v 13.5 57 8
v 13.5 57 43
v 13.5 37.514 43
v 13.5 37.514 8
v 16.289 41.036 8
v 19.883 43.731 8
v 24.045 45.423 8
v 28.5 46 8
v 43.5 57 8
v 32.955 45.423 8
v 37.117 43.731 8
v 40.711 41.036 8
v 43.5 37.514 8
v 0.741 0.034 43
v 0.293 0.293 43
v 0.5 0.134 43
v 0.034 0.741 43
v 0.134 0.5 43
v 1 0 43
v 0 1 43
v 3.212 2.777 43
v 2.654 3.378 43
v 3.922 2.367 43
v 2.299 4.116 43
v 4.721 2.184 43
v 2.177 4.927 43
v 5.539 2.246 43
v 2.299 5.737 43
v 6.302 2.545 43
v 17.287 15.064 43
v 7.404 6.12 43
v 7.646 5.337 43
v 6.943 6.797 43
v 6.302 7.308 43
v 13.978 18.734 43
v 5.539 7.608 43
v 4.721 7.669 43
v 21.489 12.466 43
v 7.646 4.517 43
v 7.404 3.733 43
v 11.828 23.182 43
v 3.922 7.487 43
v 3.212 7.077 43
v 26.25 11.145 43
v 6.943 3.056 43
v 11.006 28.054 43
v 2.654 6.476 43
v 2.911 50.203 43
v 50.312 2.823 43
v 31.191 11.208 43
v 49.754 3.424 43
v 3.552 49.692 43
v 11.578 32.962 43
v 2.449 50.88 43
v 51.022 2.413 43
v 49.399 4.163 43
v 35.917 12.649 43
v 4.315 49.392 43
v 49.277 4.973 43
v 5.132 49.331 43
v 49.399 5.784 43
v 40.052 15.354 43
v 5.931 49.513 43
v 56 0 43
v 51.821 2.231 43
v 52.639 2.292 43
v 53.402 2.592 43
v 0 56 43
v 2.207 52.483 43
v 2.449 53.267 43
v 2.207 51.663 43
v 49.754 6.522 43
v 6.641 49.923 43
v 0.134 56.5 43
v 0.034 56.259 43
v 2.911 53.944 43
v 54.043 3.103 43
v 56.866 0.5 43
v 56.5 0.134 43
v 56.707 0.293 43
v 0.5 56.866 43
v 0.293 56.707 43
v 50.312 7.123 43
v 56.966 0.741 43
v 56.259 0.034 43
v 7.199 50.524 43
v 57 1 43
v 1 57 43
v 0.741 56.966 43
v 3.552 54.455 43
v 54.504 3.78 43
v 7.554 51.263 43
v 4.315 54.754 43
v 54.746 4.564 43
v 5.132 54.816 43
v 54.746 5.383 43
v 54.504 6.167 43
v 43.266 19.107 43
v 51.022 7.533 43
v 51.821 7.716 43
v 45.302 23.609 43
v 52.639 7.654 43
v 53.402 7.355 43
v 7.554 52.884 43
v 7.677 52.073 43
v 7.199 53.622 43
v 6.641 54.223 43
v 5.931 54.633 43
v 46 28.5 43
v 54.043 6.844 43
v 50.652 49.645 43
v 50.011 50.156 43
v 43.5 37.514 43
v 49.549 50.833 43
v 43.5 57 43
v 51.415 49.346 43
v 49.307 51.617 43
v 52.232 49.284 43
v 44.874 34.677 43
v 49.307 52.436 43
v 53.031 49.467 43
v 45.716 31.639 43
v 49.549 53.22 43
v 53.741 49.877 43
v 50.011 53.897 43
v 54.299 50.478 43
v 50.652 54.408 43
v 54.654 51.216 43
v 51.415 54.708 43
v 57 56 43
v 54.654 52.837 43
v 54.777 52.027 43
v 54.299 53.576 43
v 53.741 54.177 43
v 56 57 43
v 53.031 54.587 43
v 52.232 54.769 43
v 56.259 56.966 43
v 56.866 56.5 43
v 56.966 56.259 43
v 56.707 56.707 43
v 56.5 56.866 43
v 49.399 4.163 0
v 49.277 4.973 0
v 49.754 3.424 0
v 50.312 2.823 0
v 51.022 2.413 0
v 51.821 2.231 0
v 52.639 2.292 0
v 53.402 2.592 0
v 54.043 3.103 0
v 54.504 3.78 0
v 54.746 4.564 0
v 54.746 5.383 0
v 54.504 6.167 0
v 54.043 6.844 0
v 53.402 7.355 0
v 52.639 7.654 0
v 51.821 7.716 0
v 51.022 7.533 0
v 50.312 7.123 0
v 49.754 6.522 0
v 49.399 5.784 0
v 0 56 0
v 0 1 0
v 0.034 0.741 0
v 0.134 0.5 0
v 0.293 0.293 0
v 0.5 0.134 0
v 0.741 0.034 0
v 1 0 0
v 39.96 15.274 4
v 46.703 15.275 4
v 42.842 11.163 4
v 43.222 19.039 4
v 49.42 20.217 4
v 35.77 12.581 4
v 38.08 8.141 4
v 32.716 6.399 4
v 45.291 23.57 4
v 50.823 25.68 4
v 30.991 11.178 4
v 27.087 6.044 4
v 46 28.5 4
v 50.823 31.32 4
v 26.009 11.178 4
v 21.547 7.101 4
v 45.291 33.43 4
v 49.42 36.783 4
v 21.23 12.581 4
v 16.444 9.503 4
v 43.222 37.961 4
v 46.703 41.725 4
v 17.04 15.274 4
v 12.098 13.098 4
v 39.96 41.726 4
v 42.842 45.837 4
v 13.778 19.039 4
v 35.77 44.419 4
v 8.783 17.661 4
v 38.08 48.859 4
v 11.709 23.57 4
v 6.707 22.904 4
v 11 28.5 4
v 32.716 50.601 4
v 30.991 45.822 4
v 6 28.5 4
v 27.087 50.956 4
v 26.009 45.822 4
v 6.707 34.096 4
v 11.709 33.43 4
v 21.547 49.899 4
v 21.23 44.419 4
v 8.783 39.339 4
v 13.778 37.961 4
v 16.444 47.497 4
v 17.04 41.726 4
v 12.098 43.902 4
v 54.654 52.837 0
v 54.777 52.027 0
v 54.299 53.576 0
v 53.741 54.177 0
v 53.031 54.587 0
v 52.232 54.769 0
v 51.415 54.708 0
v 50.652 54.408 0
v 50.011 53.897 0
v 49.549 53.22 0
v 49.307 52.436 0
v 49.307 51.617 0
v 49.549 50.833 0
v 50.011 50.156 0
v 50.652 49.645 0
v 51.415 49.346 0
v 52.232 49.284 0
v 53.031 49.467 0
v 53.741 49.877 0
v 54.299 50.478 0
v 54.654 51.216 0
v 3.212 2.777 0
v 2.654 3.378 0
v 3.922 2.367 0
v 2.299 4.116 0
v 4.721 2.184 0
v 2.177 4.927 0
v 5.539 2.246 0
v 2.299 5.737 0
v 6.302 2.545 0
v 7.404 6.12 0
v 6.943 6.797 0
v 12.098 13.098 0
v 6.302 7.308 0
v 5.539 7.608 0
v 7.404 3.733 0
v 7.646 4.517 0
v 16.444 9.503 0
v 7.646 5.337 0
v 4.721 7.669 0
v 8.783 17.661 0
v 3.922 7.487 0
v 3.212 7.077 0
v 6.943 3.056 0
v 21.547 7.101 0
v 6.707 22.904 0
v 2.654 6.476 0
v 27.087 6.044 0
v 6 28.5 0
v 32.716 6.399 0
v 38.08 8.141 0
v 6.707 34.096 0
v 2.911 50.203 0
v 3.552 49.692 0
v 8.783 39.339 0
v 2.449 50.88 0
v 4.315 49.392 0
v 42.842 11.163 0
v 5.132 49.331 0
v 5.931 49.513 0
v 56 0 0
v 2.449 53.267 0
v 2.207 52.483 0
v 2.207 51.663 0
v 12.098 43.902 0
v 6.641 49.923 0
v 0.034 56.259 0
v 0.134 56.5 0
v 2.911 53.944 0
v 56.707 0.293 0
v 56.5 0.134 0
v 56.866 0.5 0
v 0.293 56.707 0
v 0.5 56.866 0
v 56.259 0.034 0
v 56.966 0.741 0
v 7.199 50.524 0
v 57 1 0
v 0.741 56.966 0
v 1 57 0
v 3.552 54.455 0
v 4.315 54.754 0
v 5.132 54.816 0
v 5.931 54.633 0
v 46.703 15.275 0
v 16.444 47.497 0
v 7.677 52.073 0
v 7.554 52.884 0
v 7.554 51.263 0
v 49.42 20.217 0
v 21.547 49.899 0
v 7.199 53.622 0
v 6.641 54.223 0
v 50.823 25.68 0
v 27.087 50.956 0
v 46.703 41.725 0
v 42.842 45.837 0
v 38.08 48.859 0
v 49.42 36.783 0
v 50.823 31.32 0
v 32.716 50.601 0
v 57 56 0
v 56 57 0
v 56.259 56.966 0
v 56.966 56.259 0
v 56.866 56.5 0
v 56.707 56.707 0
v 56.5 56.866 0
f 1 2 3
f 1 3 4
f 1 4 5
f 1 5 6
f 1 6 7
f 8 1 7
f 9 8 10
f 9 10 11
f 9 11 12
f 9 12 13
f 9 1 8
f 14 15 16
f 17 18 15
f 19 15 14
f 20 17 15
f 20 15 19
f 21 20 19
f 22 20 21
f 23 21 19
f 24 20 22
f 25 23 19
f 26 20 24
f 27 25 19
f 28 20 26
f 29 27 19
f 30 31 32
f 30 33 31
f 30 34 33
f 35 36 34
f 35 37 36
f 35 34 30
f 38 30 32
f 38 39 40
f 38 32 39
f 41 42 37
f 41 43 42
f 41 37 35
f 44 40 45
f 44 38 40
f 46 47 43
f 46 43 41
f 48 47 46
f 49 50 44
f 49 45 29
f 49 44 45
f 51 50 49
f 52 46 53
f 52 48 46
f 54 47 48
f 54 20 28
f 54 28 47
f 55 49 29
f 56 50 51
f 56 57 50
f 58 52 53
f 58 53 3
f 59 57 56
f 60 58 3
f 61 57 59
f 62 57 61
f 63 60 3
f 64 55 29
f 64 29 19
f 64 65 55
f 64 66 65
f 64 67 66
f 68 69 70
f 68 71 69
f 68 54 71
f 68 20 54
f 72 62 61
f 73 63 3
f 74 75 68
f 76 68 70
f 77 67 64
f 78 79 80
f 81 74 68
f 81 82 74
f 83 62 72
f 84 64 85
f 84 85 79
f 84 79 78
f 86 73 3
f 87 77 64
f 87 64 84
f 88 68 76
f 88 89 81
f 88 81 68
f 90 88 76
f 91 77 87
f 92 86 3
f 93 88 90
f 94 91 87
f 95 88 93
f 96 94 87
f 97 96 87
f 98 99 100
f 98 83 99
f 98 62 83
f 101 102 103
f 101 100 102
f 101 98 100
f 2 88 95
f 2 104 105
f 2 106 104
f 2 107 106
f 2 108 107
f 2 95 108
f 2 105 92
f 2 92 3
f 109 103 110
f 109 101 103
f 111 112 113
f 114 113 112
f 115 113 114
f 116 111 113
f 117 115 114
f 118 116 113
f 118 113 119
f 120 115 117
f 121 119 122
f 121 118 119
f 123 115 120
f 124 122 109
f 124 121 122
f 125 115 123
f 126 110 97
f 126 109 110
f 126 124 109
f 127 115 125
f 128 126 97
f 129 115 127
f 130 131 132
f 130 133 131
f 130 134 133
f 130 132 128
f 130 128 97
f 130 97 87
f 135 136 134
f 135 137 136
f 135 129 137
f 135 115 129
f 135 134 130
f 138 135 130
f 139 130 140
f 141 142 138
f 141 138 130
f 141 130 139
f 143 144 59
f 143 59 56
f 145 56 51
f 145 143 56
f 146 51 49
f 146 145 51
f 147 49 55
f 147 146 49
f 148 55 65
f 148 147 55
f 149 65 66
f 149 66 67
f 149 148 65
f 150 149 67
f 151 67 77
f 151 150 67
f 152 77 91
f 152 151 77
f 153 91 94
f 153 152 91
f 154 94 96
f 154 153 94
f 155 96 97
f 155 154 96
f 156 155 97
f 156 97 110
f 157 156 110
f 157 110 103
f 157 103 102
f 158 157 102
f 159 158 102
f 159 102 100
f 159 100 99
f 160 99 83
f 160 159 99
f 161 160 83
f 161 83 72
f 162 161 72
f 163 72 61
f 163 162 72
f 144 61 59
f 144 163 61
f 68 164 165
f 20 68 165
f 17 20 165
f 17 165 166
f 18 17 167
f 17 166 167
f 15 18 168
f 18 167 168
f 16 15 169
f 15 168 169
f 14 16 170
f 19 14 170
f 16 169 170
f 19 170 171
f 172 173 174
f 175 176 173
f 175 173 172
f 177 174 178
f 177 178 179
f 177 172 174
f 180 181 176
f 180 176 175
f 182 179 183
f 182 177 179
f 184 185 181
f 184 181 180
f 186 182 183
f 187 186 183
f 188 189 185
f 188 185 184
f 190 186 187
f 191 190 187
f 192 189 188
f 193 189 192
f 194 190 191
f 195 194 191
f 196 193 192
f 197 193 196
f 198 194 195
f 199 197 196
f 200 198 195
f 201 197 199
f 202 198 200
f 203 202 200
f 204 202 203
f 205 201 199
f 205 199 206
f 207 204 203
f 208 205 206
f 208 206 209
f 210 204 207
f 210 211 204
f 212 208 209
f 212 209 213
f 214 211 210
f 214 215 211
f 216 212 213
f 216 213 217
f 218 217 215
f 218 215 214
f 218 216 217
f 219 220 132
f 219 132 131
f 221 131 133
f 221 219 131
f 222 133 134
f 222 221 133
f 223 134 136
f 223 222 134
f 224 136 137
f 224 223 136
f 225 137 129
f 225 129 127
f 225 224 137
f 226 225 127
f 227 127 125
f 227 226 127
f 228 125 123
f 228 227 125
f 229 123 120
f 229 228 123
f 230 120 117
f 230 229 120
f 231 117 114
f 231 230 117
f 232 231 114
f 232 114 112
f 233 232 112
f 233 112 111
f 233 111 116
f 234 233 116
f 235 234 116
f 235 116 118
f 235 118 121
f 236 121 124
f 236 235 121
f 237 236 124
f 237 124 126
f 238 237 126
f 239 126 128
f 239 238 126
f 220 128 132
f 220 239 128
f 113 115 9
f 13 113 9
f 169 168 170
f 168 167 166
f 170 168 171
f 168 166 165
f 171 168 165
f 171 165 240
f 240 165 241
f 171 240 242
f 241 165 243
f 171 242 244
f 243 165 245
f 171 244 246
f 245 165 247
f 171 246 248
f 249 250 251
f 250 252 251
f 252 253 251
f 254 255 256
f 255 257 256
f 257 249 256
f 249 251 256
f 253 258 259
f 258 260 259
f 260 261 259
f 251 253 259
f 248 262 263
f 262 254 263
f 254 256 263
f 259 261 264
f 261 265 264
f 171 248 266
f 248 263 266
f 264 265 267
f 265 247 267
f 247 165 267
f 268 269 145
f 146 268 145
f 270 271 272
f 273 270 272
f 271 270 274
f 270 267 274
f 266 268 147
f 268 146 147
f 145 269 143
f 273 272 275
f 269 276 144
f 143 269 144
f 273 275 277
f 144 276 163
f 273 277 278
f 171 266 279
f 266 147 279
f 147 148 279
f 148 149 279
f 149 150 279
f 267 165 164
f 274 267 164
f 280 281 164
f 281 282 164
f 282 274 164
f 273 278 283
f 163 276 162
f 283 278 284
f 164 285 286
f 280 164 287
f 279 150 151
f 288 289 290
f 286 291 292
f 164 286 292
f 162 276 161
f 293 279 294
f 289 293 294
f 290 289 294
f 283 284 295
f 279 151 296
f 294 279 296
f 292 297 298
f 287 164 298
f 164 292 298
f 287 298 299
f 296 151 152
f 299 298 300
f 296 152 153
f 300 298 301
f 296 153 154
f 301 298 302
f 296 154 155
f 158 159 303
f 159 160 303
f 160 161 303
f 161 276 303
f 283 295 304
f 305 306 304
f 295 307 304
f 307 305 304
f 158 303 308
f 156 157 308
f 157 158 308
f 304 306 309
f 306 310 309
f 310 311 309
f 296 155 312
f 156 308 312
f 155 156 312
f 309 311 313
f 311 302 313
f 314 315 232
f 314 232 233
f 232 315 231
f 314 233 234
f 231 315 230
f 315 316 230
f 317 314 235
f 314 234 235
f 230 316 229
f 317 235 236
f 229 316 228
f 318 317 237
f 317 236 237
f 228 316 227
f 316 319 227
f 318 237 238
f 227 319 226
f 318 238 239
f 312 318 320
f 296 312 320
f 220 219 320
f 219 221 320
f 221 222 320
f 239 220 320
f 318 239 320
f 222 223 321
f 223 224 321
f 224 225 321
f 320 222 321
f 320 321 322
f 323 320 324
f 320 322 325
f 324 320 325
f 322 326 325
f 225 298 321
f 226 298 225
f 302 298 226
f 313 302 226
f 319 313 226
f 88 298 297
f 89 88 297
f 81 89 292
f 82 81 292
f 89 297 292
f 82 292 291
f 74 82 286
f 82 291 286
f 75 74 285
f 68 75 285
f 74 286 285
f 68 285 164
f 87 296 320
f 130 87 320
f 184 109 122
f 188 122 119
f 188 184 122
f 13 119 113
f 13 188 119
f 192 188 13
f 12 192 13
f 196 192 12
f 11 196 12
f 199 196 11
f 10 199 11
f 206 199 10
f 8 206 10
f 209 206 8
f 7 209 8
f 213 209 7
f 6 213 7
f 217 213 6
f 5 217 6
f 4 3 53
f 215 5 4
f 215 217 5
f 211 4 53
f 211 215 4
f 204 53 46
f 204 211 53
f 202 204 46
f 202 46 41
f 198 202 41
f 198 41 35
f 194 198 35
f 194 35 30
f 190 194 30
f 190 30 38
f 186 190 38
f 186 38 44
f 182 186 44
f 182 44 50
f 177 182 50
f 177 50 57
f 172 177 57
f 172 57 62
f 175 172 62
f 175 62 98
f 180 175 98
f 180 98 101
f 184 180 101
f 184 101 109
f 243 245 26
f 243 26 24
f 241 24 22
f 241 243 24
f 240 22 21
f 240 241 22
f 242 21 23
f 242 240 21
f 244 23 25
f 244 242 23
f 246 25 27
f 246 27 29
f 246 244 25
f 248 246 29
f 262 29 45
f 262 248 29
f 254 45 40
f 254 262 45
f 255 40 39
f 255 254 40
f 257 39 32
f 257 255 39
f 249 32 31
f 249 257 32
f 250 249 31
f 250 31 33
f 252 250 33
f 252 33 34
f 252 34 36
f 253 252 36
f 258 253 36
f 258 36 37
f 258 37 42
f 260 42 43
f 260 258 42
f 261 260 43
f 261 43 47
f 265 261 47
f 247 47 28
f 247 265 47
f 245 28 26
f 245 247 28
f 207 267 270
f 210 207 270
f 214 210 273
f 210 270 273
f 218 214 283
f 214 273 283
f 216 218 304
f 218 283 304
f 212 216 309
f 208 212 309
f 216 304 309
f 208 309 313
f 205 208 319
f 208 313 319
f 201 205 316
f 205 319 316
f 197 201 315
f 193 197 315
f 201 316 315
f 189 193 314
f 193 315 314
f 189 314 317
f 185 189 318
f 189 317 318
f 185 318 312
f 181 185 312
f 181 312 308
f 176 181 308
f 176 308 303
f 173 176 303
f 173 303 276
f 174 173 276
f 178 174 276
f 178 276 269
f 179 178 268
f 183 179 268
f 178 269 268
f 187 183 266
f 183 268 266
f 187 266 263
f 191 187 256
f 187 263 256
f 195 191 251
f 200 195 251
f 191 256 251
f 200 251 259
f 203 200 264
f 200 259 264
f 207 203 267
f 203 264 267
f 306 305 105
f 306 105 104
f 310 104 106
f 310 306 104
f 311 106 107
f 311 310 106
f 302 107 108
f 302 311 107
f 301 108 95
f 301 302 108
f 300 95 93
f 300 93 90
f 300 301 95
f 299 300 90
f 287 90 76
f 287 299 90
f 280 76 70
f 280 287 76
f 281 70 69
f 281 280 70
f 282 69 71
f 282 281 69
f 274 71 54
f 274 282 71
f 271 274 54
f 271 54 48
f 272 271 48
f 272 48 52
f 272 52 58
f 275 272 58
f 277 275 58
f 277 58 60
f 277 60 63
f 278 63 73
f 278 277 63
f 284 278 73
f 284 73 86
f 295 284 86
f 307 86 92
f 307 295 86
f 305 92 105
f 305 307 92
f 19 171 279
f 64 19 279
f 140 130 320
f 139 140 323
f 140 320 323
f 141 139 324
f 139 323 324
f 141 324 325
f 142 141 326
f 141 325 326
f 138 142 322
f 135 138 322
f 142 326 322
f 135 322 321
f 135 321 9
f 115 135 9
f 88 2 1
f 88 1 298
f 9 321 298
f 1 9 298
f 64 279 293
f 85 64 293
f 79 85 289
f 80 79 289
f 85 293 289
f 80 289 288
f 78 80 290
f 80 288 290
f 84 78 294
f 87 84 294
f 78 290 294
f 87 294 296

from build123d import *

# Parameters (mm, degrees)
ESQUISSE1_R             = 17.5
ESQUISSE1_R_2           = 2.75
BOSS_EXTRU_1_DEPTH      = 43
ESQUISSE2_W             = 30
ESQUISSE2_H             = 35
ENL_V_MAT_EXTRU_1_DEPTH = 30
ESQUISSE3_R             = 22.5
ENL_V_MAT_EXTRU_2_DEPTH = 4


with BuildPart() as part:
    # Esquisse1 → Boss.-Extru.1 (new body)
    with BuildSketch(Plane.XY):
        with BuildLine():
            Line((1, 0), (56, 0))
            ThreePointArc((56, 0), (56.707106781, 0.292893219), (57, 1))
            Line((57, 1), (57, 56))
            ThreePointArc((57, 56), (56.707106781, 56.707106781), (56, 57))
            Line((56, 57), (1, 57))
            ThreePointArc((1, 57), (0.292893219, 56.707106781), (0, 56))
            Line((0, 56), (0, 1))
            ThreePointArc((0, 1), (0.292893219, 0.292893219), (1, 0))
        make_face()
        with Locations((28.5, 28.5)):
            Circle(ESQUISSE1_R, mode=Mode.SUBTRACT)
        with Locations((4.926655582, 52.073344418)):
            Circle(ESQUISSE1_R_2, mode=Mode.SUBTRACT)
        with Locations((52.026632419, 52.026632419)):
            Circle(ESQUISSE1_R_2, mode=Mode.SUBTRACT)
        with Locations(Location((4.926655582, 4.926655582, 0), (0, 0, 180))):
            Circle(ESQUISSE1_R_2, mode=Mode.SUBTRACT)
        with Locations(Location((52.026632419, 4.973367581, 0), (0, 0, 180))):
            Circle(ESQUISSE1_R_2, mode=Mode.SUBTRACT)
    extrude(amount=BOSS_EXTRU_1_DEPTH)

    # Esquisse2 → Enlèv. mat.-Extru.1 (cut)
    with BuildSketch(Plane(origin=(0, 57, 0), x_dir=(1, 0, 0), z_dir=(0, 1, 0))):
        with Locations((28.5, -25.5)):
            Rectangle(ESQUISSE2_W, ESQUISSE2_H)
    extrude(amount=-ENL_V_MAT_EXTRU_1_DEPTH, mode=Mode.SUBTRACT)

    # Esquisse3 → Enlèv. mat.-Extru.2 (cut)
    with BuildSketch(Plane(origin=(0, 0, 0), x_dir=(-1, 0, 0), z_dir=(0, 0, -1))):
        with Locations((-28.5, 28.5)):
            Circle(ESQUISSE3_R)
    extrude(amount=-ENL_V_MAT_EXTRU_2_DEPTH, mode=Mode.SUBTRACT)


solid = part.part
